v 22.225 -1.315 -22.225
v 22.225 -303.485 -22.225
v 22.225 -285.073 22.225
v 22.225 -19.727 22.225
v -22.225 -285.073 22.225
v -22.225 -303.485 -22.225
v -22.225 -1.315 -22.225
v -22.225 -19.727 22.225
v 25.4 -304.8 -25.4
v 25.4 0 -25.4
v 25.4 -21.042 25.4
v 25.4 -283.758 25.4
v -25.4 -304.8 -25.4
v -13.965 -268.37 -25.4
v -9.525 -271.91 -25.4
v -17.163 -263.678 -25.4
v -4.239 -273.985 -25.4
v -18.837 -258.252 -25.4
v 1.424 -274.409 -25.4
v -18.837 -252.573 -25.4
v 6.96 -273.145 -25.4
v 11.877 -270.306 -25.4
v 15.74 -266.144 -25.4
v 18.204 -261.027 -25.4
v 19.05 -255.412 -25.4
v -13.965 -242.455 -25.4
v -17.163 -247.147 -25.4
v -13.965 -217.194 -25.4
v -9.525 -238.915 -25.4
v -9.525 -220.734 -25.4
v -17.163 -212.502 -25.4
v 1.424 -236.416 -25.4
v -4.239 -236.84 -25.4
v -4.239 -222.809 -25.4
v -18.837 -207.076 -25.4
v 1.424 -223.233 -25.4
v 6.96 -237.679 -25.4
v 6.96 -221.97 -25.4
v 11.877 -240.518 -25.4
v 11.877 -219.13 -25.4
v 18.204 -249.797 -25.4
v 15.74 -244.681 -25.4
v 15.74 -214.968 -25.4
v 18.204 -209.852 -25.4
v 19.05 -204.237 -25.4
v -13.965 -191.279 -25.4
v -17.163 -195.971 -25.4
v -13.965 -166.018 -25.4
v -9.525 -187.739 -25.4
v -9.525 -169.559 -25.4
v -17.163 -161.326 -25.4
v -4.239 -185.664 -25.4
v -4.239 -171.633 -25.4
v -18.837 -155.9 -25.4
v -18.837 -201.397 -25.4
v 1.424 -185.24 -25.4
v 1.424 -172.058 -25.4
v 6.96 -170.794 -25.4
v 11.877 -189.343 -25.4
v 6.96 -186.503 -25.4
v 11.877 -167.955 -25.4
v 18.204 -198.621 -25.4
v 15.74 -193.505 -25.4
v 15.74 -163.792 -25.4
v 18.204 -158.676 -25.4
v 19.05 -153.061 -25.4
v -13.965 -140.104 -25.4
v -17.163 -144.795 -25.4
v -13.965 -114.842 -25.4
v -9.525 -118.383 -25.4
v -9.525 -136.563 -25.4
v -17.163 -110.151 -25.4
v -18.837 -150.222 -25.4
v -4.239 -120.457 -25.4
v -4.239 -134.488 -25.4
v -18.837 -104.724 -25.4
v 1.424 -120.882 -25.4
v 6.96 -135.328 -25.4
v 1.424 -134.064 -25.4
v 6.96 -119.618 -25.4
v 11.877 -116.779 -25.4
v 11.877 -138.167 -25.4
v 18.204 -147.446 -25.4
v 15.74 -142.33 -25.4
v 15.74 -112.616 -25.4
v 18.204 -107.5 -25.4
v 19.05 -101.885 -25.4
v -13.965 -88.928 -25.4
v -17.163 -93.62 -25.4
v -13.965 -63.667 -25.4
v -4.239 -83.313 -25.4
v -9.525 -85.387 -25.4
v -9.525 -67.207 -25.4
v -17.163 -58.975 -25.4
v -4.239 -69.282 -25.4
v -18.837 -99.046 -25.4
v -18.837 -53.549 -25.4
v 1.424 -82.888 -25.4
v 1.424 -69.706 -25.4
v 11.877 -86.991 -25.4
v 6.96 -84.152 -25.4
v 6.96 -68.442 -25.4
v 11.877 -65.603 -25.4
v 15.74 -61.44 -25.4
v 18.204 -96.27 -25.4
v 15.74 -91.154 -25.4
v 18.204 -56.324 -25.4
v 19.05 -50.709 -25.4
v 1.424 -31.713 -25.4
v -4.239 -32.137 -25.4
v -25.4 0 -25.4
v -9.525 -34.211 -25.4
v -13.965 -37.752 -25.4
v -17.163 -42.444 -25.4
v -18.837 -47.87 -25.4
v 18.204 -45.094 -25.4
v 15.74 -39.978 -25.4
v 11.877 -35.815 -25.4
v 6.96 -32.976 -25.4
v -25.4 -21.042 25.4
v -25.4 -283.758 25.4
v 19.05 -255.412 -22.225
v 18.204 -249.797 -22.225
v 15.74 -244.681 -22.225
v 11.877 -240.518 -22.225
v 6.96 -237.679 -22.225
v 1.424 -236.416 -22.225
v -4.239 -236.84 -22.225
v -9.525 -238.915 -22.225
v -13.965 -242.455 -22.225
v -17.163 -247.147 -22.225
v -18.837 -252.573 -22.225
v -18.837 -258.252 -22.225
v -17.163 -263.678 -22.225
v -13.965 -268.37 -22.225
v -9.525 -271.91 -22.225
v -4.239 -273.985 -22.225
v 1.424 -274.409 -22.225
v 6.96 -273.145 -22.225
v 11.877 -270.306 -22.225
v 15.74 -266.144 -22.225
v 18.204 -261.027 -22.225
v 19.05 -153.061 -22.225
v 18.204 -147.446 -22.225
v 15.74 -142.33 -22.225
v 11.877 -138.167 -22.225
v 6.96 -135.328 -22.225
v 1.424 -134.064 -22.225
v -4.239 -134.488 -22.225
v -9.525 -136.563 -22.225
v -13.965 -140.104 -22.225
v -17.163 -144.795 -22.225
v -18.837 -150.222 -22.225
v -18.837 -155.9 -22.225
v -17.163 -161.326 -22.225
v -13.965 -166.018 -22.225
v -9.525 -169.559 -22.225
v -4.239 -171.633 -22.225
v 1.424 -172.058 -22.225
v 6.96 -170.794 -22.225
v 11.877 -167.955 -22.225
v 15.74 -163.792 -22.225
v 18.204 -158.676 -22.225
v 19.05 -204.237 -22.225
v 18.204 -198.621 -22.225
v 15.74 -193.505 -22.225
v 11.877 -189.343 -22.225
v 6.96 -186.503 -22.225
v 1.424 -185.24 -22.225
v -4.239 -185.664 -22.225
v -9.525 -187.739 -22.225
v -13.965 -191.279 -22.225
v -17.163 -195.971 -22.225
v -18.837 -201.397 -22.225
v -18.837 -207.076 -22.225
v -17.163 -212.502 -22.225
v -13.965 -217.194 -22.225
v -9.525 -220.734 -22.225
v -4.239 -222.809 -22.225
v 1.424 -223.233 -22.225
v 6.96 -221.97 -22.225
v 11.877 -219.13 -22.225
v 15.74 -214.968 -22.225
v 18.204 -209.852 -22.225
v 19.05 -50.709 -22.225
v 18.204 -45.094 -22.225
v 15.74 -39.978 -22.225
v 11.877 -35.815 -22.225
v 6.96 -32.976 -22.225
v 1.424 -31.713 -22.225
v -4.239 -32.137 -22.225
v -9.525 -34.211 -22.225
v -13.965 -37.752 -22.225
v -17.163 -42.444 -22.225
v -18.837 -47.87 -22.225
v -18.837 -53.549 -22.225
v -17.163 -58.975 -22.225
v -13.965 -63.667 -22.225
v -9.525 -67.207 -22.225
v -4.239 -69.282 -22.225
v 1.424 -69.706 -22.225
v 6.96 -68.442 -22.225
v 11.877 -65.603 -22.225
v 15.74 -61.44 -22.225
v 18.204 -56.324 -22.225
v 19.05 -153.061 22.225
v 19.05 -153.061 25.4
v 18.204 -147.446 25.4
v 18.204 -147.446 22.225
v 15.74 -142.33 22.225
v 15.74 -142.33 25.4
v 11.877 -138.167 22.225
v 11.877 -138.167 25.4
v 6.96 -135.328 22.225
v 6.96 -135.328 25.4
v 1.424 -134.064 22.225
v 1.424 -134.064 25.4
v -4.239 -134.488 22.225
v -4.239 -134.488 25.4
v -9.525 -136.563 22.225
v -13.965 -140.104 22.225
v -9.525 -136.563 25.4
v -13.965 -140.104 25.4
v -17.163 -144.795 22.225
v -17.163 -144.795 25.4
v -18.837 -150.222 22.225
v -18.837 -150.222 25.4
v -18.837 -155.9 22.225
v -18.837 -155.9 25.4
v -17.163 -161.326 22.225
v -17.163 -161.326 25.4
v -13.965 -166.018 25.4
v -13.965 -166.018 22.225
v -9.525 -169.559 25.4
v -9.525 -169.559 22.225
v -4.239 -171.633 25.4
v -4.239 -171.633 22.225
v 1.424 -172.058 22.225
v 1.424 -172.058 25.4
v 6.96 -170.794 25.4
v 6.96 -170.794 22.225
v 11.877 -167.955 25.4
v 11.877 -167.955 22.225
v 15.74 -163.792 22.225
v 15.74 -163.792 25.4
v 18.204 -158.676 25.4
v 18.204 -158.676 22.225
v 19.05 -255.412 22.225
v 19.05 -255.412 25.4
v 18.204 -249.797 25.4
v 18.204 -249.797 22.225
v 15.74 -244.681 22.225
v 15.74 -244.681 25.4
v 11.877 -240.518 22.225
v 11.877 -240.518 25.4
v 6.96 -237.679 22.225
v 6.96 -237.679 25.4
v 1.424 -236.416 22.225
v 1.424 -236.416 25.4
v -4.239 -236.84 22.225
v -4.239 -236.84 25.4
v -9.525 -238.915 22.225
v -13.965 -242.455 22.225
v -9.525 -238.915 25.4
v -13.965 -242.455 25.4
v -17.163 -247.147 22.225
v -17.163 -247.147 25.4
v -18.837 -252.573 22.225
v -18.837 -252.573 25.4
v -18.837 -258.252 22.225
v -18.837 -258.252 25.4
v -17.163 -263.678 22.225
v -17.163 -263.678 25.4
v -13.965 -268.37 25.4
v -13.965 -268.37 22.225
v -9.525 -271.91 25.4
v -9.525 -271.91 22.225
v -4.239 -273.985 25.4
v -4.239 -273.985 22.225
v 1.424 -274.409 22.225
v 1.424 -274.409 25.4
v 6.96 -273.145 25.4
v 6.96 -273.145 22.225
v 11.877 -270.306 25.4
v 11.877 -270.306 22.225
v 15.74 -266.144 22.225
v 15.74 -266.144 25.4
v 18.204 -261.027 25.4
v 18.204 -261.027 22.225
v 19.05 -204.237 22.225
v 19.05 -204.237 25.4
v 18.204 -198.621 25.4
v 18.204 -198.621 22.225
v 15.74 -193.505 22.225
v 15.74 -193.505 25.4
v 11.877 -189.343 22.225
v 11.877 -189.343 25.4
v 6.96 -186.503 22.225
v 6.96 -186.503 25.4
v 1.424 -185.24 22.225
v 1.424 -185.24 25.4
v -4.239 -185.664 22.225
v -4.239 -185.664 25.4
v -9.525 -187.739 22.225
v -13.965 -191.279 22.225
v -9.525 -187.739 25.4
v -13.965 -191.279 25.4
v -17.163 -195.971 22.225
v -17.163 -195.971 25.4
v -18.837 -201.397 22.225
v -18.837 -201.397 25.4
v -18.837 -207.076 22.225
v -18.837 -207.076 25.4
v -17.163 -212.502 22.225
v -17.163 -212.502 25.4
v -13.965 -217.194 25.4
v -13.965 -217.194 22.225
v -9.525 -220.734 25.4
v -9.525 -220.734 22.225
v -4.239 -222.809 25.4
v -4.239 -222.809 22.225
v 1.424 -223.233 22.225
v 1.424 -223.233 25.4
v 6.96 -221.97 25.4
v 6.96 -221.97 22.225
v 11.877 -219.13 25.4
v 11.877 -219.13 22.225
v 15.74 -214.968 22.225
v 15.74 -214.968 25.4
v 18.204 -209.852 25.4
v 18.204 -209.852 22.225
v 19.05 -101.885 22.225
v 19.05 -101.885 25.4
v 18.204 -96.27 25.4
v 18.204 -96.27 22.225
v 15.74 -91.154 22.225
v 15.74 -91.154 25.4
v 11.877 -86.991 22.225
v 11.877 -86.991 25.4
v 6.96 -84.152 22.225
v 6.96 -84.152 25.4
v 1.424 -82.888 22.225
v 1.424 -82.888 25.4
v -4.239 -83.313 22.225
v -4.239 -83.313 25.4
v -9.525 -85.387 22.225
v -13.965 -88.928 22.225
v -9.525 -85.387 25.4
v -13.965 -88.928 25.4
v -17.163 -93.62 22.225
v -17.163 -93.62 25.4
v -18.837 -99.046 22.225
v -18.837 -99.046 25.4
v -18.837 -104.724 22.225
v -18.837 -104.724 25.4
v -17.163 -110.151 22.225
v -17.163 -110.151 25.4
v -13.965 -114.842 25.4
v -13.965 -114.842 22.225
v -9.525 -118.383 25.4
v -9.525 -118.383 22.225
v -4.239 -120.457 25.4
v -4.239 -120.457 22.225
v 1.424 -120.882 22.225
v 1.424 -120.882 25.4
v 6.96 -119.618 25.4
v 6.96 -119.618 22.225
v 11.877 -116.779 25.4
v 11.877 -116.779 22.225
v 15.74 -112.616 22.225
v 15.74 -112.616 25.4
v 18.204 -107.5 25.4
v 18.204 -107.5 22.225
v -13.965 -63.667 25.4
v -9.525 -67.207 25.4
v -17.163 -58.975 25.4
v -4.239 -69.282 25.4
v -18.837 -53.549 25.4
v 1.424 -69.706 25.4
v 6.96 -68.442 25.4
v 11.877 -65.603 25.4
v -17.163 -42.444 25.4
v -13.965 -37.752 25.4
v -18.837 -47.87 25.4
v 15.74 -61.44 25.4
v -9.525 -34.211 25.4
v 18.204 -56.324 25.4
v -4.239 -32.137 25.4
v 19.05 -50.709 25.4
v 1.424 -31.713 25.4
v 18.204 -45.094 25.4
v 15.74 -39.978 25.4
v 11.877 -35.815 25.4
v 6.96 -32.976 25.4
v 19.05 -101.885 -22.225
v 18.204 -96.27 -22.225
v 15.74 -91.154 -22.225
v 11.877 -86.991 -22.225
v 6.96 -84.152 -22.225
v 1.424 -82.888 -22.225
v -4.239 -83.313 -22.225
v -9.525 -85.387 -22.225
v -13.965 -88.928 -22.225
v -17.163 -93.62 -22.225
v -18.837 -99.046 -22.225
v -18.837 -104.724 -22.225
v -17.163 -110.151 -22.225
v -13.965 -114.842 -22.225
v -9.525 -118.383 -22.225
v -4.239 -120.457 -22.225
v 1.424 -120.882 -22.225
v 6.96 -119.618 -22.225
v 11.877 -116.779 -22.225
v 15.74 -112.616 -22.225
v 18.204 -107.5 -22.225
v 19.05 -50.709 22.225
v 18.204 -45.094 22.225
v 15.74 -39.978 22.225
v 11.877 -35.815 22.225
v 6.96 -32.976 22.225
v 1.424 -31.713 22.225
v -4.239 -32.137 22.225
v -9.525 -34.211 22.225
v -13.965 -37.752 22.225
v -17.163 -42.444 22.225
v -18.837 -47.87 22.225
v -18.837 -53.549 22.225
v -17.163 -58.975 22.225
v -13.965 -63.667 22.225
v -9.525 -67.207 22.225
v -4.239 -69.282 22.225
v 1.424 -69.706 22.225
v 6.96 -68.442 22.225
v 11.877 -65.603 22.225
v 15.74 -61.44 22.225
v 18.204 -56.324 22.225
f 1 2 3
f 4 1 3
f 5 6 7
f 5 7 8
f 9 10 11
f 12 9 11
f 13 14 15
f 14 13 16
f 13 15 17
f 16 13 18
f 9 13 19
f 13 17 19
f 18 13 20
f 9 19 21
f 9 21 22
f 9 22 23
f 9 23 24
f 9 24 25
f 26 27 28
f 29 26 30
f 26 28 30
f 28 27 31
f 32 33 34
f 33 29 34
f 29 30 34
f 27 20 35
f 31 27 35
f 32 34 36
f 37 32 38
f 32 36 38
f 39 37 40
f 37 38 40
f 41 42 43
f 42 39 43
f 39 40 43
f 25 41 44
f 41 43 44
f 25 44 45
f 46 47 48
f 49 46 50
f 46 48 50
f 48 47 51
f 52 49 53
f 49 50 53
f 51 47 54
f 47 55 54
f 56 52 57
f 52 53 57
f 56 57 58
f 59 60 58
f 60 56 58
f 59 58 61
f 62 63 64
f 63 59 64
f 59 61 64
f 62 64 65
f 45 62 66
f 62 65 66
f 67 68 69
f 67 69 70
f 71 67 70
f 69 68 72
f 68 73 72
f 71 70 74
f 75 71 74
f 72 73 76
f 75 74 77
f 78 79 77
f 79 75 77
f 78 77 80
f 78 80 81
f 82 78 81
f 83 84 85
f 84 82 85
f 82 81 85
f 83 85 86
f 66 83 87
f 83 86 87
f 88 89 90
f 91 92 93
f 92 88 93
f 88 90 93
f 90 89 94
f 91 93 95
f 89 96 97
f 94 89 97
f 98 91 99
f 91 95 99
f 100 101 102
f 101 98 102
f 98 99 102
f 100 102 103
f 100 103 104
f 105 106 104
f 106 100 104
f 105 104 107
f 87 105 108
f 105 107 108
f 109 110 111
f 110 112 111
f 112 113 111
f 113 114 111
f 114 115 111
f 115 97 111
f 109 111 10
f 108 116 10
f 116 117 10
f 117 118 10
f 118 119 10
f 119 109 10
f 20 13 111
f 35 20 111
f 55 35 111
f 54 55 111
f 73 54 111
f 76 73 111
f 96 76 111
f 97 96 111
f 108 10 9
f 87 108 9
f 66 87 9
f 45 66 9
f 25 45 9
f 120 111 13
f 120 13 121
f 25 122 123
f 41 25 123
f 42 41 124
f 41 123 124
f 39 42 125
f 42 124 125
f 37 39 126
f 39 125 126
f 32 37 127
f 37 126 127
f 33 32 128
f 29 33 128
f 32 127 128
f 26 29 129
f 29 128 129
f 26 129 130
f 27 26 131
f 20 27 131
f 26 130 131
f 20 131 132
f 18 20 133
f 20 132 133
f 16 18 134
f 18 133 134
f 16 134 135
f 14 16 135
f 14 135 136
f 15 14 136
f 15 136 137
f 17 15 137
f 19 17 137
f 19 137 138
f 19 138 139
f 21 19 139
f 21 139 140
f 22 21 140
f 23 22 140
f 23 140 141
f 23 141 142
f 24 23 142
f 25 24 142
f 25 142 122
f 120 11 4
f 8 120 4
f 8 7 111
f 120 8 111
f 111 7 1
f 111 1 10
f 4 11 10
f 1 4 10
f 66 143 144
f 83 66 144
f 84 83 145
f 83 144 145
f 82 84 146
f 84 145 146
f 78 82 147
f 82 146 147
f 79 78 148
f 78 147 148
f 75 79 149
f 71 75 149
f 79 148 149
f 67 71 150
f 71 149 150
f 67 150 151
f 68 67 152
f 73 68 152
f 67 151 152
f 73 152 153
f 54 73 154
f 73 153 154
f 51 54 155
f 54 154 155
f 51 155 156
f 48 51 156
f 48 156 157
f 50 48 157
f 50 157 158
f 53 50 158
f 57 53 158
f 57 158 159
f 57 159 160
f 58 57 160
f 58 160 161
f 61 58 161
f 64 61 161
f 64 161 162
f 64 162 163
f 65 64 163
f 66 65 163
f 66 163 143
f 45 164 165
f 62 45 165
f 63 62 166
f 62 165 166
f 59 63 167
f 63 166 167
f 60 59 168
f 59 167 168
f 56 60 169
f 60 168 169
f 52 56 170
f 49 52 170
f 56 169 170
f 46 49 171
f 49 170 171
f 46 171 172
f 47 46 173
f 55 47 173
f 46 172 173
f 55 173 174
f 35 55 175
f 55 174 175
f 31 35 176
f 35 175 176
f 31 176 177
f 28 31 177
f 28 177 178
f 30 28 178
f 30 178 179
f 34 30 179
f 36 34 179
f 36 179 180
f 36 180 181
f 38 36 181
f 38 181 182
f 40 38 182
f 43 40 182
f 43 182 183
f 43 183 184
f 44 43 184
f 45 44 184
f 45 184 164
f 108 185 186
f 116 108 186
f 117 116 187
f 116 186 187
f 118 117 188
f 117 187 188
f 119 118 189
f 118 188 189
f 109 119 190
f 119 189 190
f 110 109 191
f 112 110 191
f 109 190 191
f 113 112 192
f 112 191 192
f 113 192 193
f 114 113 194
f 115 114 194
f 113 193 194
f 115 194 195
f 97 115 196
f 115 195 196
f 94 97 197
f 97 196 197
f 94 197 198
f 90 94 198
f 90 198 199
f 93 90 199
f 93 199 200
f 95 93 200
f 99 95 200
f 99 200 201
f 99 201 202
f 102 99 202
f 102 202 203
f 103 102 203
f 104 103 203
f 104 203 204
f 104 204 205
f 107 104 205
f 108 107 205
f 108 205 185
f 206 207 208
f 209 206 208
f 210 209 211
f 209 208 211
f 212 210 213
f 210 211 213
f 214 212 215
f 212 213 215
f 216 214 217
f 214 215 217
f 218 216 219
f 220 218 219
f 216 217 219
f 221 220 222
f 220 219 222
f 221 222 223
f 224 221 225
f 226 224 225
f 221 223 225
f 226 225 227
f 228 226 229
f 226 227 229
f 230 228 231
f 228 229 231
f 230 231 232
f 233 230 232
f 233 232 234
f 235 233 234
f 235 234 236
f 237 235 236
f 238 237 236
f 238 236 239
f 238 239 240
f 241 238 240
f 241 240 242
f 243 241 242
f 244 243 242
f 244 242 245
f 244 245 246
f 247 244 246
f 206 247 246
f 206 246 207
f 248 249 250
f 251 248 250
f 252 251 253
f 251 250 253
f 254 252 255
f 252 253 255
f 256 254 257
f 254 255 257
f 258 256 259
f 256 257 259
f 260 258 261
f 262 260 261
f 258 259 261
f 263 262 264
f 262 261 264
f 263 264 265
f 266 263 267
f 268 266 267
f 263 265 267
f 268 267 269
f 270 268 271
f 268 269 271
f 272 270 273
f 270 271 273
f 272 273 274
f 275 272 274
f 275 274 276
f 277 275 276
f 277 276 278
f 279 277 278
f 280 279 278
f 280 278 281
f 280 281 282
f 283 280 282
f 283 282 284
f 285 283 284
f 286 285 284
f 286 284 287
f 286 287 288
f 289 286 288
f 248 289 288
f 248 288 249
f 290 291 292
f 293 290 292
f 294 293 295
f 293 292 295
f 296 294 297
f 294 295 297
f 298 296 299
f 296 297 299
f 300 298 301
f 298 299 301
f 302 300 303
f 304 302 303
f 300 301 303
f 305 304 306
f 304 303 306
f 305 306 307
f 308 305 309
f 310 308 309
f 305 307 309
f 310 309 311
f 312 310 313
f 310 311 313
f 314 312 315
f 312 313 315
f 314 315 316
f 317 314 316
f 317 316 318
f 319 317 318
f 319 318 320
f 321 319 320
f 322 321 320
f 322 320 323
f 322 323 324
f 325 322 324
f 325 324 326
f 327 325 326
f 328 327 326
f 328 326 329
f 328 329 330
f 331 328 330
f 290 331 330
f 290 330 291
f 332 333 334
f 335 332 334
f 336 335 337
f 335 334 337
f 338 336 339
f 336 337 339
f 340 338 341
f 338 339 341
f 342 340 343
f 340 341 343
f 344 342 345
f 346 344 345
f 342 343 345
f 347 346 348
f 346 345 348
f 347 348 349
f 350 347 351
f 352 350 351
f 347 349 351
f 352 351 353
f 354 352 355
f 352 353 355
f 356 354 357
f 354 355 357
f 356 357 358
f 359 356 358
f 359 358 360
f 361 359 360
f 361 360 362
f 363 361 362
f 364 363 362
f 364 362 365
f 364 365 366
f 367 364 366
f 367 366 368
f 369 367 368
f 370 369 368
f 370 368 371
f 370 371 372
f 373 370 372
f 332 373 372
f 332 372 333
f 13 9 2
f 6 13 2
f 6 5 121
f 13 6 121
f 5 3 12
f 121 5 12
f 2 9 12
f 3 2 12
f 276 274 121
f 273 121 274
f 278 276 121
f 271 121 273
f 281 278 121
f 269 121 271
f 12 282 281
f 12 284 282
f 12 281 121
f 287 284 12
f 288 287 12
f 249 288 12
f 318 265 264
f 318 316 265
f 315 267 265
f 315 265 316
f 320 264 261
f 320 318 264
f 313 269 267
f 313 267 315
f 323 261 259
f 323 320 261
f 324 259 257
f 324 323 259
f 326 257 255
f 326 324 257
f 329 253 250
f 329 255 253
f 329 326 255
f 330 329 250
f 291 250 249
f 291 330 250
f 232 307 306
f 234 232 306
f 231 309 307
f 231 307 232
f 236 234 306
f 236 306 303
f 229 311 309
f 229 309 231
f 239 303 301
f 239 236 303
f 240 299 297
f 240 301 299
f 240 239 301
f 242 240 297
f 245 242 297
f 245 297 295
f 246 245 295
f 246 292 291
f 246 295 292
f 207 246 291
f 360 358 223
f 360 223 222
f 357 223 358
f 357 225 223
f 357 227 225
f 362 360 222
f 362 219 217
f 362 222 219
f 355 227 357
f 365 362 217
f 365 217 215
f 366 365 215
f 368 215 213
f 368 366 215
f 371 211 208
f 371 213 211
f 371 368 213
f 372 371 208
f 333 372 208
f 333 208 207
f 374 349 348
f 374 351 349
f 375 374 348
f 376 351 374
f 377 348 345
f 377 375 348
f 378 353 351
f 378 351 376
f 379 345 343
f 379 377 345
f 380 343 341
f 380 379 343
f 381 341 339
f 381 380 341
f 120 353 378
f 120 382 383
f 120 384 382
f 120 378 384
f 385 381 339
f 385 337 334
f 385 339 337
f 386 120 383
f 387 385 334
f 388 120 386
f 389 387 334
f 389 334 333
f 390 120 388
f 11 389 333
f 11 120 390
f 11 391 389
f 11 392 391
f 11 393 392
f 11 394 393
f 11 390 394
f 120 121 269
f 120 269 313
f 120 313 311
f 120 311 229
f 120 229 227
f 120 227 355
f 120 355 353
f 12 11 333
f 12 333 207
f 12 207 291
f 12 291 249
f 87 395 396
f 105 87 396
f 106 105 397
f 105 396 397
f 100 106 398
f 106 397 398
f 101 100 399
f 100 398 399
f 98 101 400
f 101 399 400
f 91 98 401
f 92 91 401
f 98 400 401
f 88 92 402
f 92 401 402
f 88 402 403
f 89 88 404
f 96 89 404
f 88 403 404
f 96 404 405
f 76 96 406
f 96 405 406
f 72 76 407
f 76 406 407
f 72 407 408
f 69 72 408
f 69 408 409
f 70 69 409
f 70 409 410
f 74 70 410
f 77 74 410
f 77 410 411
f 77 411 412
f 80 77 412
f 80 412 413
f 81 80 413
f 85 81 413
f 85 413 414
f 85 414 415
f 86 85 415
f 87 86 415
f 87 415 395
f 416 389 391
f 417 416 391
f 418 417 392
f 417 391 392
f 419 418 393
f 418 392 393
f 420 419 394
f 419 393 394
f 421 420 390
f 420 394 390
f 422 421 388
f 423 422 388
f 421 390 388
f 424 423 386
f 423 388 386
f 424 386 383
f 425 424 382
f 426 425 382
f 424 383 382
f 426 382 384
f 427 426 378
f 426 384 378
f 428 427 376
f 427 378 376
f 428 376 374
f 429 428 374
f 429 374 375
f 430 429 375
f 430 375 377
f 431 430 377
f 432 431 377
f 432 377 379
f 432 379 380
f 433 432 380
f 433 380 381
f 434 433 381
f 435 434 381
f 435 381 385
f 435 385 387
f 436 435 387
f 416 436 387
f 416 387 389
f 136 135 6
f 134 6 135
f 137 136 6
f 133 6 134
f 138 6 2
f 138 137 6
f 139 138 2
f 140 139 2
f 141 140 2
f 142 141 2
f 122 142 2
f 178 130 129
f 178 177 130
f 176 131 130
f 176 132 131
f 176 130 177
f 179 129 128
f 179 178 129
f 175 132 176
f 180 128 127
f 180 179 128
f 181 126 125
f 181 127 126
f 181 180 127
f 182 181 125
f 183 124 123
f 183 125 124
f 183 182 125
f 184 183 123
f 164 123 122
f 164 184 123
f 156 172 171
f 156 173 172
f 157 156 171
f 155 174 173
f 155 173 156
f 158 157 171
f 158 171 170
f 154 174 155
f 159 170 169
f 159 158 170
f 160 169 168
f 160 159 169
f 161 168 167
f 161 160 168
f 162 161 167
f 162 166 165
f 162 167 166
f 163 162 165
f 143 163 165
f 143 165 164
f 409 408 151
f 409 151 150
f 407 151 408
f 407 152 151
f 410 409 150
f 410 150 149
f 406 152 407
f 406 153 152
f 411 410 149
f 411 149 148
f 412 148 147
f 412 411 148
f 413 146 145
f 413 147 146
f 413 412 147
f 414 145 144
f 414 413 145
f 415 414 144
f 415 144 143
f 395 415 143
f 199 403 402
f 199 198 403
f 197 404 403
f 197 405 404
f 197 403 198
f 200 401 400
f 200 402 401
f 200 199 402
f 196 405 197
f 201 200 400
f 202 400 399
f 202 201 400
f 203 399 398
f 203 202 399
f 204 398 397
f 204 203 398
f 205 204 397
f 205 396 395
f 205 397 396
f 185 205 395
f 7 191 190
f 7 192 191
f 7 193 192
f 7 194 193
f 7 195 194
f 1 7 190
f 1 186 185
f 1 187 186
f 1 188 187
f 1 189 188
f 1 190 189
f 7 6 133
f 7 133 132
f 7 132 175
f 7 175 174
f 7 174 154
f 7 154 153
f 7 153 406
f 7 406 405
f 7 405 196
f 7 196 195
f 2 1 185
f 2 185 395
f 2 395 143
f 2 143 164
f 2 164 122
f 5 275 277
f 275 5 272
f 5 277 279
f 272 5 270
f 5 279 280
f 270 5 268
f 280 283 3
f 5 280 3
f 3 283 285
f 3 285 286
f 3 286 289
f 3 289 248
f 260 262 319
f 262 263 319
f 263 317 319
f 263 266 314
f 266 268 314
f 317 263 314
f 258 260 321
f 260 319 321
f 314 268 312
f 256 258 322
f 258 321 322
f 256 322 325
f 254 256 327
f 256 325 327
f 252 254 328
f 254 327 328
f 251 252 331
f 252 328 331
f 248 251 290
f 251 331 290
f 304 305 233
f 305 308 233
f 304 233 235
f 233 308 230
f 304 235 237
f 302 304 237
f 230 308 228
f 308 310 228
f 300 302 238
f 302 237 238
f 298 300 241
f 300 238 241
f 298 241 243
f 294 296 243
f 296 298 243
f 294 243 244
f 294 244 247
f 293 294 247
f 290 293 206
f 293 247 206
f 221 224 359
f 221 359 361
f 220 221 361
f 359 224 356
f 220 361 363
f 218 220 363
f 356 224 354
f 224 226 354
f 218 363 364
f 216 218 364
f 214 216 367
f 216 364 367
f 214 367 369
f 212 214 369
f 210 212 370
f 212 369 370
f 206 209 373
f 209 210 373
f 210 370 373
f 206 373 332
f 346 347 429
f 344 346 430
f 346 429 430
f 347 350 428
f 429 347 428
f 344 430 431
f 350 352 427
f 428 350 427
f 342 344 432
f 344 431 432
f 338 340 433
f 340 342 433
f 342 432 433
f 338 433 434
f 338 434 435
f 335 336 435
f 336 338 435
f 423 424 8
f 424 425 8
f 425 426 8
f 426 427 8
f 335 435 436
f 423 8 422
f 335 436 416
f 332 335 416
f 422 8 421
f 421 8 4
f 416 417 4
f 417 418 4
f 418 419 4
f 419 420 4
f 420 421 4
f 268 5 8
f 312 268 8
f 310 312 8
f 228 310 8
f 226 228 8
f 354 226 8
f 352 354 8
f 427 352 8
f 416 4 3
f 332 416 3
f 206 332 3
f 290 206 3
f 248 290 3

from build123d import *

# Parameters (mm, degrees)
F1_W     = 50.8
F1_H     = 50.8
F1_W_2   = 44.45
F1_H_2   = 44.45
F2_DEPTH = 304.8
F4_DEPTH = 50.801
F6_DEPTH = 127
F7_R     = 19.05
F8_DEPTH = 50.8


with BuildPart() as f2:
    # F1 (on face) → F2 (new body)
    with BuildSketch(Plane.XZ):
        Rectangle(F1_W, F1_H)
        Rectangle(F1_W_2, F1_H_2, mode=Mode.SUBTRACT)
    extrude(amount=F2_DEPTH)

    # F3 (on face) → F4 (cut, through all)
    with BuildSketch(Plane.YZ.offset(25.4)):
        Polygon((-283.757951, 25.4), (-304.8, 25.4), (-304.8, -25.4), align=None)
    extrude(amount=-F4_DEPTH, mode=Mode.SUBTRACT)

    # F5 (on face) → F6 (cut)
    with BuildSketch(Plane.YZ.offset(25.4)):
        Polygon((0, -25.4), (0, 25.4), (-21.042049, 25.4), align=None)
    extrude(amount=-F6_DEPTH, mode=Mode.SUBTRACT)

    # F7 (on face) → F8 (cut)
    with BuildSketch(Plane.XY.offset(25.4)):
        with Locations((0, -50.709249)):
            Circle(F7_R)
        with Locations((0, -101.885025)):
            Circle(F7_R)
        with Locations((0, -153.060801)):
            Circle(F7_R)
        with Locations((0, -204.236577)):
            Circle(F7_R)
        with Locations((0, -255.412352)):
            Circle(F7_R)
    extrude(amount=-F8_DEPTH, mode=Mode.SUBTRACT)


solid = f2.part
